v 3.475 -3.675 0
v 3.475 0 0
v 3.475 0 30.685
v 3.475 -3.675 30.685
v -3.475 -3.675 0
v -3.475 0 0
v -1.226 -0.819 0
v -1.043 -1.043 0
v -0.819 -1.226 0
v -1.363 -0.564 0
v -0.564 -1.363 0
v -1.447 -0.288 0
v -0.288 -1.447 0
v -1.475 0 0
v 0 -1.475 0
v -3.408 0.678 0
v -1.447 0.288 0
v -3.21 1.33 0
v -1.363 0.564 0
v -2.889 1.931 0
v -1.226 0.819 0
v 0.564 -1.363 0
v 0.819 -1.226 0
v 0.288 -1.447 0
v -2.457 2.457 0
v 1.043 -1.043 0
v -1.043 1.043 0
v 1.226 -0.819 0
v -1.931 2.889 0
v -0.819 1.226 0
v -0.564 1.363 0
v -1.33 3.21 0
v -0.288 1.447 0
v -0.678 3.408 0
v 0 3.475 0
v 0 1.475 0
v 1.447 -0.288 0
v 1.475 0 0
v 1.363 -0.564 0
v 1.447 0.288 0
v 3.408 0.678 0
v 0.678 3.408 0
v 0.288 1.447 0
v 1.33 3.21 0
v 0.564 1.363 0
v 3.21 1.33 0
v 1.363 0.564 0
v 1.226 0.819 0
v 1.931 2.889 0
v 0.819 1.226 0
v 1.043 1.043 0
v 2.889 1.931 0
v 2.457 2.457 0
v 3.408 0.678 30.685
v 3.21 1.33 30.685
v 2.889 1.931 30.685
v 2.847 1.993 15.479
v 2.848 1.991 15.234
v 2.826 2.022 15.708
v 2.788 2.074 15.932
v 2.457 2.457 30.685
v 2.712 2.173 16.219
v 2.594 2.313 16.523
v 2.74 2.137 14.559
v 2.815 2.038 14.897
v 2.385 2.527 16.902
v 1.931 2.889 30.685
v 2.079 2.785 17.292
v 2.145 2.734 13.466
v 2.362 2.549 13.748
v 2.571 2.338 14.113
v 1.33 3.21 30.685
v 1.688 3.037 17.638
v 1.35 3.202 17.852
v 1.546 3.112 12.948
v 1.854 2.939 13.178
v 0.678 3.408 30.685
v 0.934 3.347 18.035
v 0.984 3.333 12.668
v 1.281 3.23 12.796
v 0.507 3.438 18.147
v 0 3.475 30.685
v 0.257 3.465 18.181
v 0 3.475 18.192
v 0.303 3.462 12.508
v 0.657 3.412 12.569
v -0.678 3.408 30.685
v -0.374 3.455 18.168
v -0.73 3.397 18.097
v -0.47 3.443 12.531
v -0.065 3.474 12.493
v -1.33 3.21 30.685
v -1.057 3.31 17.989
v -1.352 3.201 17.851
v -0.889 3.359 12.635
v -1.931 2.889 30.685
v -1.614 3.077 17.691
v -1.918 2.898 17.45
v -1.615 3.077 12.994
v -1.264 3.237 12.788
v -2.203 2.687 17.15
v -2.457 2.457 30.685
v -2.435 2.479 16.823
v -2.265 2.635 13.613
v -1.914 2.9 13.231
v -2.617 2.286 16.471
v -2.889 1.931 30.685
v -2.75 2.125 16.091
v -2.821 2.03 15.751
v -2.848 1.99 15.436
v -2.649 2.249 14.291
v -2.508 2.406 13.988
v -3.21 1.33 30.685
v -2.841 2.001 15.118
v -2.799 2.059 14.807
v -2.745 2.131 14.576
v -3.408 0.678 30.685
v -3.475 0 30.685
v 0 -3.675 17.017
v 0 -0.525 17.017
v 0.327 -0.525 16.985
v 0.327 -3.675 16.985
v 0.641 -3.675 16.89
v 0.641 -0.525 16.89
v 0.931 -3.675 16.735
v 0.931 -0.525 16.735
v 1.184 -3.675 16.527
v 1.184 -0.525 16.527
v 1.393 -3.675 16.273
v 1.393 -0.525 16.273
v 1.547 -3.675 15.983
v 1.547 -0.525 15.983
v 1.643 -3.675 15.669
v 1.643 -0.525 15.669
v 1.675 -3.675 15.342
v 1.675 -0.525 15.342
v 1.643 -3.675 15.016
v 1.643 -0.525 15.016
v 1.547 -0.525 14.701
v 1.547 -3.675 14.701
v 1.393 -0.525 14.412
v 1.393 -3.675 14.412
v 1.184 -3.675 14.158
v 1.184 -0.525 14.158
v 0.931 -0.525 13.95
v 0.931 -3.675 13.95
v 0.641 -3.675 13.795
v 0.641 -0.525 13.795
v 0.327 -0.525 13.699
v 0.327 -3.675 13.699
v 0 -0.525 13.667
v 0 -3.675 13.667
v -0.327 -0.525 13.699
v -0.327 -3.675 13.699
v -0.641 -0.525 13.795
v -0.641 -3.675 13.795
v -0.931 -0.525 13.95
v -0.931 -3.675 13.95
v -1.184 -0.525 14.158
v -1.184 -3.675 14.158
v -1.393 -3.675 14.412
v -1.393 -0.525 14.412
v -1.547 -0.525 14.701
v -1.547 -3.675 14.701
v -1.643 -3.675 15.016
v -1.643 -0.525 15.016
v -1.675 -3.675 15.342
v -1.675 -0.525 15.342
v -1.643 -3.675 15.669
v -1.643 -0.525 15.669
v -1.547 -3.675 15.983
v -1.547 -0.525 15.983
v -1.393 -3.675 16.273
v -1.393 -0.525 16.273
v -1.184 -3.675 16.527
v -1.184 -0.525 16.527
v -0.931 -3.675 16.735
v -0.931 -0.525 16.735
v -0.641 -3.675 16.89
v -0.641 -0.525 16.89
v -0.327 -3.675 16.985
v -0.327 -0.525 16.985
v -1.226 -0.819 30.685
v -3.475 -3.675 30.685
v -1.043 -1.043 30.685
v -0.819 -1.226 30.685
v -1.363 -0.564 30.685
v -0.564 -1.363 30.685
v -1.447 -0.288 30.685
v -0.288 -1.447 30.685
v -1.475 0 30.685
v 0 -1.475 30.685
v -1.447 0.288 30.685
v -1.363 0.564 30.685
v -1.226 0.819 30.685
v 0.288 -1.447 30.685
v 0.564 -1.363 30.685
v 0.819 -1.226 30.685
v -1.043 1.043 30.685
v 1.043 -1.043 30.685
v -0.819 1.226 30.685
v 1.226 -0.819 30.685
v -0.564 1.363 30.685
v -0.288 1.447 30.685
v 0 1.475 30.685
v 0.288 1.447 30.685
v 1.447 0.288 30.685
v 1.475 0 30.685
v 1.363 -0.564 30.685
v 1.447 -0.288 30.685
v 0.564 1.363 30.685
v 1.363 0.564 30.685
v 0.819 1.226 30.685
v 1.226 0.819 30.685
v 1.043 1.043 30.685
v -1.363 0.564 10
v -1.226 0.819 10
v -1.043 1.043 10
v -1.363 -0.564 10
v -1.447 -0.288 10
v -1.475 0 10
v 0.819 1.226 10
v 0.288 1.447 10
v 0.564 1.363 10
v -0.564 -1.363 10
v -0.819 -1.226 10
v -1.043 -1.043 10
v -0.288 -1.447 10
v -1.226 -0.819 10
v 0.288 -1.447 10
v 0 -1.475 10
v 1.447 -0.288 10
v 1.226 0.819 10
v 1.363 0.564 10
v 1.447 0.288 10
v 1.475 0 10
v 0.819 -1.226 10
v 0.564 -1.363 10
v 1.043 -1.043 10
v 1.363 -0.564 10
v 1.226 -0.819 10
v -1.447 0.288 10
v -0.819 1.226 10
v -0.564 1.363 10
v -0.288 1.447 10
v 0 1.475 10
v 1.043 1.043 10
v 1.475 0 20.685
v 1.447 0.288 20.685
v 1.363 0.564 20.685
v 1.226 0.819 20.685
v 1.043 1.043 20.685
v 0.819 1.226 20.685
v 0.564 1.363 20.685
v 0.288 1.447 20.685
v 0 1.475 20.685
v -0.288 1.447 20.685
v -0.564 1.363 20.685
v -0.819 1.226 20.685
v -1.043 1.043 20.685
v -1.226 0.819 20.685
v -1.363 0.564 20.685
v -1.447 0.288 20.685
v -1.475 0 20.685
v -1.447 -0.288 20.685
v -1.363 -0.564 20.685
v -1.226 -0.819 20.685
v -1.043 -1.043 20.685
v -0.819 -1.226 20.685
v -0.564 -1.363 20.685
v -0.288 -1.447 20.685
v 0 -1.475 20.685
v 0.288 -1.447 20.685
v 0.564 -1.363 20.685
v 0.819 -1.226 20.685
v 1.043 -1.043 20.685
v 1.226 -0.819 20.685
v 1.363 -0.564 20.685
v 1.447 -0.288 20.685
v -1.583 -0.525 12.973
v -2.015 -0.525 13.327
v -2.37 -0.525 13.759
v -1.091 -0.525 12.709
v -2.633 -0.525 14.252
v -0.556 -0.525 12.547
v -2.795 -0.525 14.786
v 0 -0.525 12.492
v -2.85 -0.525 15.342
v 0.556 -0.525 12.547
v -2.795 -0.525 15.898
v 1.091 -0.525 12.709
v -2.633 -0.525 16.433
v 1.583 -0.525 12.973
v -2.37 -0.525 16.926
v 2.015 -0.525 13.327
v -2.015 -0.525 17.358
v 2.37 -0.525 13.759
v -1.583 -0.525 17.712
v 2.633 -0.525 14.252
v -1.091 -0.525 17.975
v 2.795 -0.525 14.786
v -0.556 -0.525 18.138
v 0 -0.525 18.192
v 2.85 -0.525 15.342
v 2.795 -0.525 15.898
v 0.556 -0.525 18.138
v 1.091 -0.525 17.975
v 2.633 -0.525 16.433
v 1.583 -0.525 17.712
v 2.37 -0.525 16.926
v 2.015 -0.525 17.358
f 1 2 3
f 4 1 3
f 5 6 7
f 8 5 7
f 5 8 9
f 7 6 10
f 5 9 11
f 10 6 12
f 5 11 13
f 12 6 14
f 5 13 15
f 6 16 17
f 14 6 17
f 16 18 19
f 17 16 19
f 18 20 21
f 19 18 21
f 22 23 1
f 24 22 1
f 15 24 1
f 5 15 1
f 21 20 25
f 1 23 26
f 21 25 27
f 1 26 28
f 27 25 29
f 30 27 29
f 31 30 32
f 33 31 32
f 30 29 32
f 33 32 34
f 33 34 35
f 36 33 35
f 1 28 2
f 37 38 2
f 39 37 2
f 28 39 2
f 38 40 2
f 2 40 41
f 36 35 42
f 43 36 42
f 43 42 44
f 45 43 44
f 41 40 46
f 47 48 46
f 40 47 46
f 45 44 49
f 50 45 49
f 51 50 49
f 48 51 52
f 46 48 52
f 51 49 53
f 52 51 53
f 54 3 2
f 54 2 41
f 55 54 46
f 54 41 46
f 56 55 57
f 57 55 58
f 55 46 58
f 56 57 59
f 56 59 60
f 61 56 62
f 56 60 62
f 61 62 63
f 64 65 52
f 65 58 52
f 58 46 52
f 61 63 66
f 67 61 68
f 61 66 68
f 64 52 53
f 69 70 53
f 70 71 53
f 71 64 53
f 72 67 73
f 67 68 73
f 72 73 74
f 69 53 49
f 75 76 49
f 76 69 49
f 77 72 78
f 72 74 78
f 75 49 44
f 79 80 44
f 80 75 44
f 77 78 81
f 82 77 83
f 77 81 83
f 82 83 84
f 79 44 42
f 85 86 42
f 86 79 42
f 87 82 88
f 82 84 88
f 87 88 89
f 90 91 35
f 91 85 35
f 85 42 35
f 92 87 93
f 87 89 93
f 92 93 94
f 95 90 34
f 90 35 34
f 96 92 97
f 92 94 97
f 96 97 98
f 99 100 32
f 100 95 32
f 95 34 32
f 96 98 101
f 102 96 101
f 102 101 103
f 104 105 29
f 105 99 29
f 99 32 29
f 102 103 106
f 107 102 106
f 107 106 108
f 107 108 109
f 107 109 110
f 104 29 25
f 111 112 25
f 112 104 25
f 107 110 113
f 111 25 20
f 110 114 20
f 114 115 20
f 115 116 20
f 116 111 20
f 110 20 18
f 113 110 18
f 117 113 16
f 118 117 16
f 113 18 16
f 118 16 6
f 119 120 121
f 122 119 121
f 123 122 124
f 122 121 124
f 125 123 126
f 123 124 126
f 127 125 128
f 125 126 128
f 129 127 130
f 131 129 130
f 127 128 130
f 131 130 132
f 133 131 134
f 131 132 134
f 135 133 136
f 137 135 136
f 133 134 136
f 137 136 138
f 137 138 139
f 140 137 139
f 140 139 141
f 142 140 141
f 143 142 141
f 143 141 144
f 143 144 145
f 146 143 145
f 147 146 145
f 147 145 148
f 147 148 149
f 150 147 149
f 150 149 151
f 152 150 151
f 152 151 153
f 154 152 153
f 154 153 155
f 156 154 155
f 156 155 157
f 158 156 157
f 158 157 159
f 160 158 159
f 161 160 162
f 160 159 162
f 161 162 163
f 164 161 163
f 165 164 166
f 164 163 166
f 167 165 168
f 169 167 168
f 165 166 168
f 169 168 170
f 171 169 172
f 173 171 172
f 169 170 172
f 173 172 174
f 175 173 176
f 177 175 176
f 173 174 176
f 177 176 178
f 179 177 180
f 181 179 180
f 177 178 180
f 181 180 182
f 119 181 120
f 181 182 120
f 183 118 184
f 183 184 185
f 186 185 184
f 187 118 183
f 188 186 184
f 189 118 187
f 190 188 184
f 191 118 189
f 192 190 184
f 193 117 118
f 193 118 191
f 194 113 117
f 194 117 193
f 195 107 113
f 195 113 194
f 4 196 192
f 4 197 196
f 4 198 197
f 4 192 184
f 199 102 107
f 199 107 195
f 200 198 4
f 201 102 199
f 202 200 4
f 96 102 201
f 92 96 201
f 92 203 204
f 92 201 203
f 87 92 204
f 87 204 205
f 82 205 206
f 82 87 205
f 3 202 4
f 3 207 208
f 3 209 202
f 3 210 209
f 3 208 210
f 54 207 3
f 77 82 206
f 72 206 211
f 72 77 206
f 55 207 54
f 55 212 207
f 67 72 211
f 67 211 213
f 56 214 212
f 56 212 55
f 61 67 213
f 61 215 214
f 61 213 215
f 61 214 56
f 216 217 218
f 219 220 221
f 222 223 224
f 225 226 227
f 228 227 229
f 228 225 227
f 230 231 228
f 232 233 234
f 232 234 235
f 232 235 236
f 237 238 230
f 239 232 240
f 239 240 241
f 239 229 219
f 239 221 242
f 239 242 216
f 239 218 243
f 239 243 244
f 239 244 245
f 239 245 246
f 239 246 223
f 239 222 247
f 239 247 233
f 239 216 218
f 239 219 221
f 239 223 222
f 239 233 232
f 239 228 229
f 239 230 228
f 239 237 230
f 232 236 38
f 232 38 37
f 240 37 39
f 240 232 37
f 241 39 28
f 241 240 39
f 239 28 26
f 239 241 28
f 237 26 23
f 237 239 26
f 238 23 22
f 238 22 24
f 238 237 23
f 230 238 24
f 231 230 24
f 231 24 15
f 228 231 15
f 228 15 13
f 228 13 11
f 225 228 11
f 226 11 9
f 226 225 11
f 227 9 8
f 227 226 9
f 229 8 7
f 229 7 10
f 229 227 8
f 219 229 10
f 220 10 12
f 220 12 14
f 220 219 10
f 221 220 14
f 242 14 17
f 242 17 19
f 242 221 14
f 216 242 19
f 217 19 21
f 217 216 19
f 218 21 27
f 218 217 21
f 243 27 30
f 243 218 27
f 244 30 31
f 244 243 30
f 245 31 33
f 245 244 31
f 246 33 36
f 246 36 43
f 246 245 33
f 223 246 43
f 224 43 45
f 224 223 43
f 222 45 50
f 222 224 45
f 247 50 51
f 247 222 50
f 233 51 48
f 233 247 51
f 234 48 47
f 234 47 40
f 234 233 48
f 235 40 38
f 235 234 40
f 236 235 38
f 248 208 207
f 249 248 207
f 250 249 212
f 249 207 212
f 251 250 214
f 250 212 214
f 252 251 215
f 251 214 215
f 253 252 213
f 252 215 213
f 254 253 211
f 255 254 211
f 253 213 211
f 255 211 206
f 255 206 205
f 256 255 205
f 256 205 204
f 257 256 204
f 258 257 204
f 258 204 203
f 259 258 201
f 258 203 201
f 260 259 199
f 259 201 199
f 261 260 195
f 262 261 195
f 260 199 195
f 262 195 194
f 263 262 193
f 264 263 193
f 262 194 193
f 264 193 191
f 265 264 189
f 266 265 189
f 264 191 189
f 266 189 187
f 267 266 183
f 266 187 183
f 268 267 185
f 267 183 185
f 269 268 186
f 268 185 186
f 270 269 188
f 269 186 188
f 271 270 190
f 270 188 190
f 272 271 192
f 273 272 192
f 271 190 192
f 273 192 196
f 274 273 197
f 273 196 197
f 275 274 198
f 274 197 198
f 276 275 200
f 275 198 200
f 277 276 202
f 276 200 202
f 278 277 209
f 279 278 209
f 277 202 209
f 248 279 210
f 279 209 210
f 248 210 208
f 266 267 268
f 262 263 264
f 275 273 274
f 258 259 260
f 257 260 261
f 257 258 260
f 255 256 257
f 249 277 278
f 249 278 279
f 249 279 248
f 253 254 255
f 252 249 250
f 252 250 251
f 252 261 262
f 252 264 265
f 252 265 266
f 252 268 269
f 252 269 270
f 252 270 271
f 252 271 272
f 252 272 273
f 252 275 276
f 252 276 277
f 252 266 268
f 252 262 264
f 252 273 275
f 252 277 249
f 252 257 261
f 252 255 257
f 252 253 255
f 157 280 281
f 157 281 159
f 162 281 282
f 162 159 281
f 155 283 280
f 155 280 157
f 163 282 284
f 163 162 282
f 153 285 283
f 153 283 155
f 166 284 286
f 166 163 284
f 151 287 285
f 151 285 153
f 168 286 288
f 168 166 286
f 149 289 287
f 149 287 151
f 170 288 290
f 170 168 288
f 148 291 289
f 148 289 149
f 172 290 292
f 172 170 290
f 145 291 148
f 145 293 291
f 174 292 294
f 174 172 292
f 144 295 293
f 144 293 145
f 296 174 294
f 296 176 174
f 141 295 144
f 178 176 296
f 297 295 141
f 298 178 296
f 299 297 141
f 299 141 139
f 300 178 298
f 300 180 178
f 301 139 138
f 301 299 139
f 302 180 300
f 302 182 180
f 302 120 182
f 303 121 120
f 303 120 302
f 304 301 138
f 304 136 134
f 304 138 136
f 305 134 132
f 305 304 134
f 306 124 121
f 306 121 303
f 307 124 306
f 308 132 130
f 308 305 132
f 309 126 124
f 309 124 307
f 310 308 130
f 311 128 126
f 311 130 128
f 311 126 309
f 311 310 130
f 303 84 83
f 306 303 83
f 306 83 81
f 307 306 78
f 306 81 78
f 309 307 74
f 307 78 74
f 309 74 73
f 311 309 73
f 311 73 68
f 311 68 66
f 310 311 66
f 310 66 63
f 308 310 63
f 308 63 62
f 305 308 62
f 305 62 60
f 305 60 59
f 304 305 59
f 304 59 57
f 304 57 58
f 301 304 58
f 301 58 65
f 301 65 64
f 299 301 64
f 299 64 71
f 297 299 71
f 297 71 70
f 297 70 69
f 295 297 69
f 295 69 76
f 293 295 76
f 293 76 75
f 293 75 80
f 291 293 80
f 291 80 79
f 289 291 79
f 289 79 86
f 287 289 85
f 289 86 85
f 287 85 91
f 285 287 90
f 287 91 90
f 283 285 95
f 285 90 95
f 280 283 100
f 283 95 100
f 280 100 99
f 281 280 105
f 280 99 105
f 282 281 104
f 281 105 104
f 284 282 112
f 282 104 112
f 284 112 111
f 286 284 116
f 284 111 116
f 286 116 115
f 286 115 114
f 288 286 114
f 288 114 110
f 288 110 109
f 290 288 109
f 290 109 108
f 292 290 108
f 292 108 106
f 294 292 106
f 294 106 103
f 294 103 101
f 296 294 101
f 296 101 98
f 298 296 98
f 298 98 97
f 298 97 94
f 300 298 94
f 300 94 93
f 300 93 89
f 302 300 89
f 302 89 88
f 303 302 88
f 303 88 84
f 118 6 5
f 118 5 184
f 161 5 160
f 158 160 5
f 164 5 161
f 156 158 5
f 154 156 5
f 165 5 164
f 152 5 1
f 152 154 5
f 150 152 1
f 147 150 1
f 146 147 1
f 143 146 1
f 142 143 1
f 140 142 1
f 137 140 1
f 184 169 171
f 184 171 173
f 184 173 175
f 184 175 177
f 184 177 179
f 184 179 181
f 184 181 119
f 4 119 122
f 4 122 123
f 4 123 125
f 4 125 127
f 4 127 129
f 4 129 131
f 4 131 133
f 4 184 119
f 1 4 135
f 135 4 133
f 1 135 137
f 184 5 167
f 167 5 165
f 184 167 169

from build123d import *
from build123d.topology import SkipClean

# Parameters (mm, degrees)
SKETCH2_R           = 3.475
BOSS_EXTRUDE2_DEPTH = 30.6846
SKETCH3_R           = 1.475
CUT_EXTRUDE1_DEPTH  = 10
CUT_EXTRUDE2_START  = -10
SKETCH4_R           = 1.475
CUT_EXTRUDE2_DEPTH  = 10
BOSS_EXTRUDE3_DEPTH = 30.6846
SKETCH6_W           = 6.95
SKETCH6_H           = 30.6846
BOSS_EXTRUDE4_DEPTH = 0.2
SKETCH8_W           = 3
SKETCH8_H           = 2
CUT_EXTRUDE3_DEPTH  = 32.675744698
SKETCH10_R          = 2.85
CUT_EXTRUDE4_DEPTH  = 3
SKETCH11_R          = 1.675
CUT_EXTRUDE5_DEPTH  = 32.138726849
BOSS_EXTRUDE5_REACH = 33.487
SKETCH12_R          = 4.85
SKETCH12_R_2        = 2.85
BOSS_EXTRUDE7_START = 1
SKETCH13_R          = 2.85
BOSS_EXTRUDE7_DEPTH = 1
CUT_EXTRUDE6_DEPTH  = 32.282148424
CUT_EXTRUDE7_DEPTH  = 32.877730235


with BuildPart() as part:
    # Sketch2 → Boss-Extrude2 (new body)
    with BuildSketch(Plane.XY):
        Circle(SKETCH2_R)
    extrude(amount=BOSS_EXTRUDE2_DEPTH)

    # Sketch3 → Cut-Extrude1 (cut)
    with BuildSketch(Plane.XY.offset(30.6846)):
        Circle(SKETCH3_R)
    extrude(amount=-CUT_EXTRUDE1_DEPTH, mode=Mode.SUBTRACT)

    # Sketch4 → Cut-Extrude2 (cut)
    with BuildSketch(Plane(origin=(0, 0, 0), x_dir=(-1, 0, 0), z_dir=(0, 0, -1)).offset(CUT_EXTRUDE2_START)):
        with Locations(Location((0, 0, 0), (0, 0, 180))):
            Circle(SKETCH4_R)
    extrude(amount=CUT_EXTRUDE2_DEPTH, mode=Mode.SUBTRACT)

    # Sketch5 → Boss-Extrude3 (add)
    with BuildSketch(Plane(origin=(0, 0, 0), x_dir=(-1, 0, 0), z_dir=(0, 0, -1))):
        with BuildLine():
            ThreePointArc((0, -3.475), (-2.457196065, -2.457196065), (-3.475, 0))
            Line((-3.475, 0), (-3.475, -3.475))
            Line((-3.475, -3.475), (0, -3.475))
        make_face()
        with BuildLine():
            Line((3.475, -3.475), (3.475, 0))
            ThreePointArc((3.475, 0), (2.457196065, -2.457196065), (0, -3.475))
            Line((0, -3.475), (3.475, -3.475))
        make_face()
    extrude(amount=-BOSS_EXTRUDE3_DEPTH)

    # Sketch6 → Boss-Extrude4 (add)
    with BuildSketch(Plane.XZ.offset(3.475)):
        with Locations((0, 15.3423)):
            Rectangle(SKETCH6_W, SKETCH6_H)
    extrude(amount=BOSS_EXTRUDE4_DEPTH)

    # Sketch8 → Cut-Extrude3 (cut, through all)
    with BuildSketch(Plane.ZY.offset(3.475)):
        with Locations((16.8423, 3.475)):
            Rectangle(SKETCH8_W, SKETCH8_H)
        with Locations((13.8423, 3.475)):
            Rectangle(SKETCH8_W, SKETCH8_H)
    extrude(amount=-CUT_EXTRUDE3_DEPTH, mode=Mode.SUBTRACT)

    # Sketch10 → Cut-Extrude4 (cut)
    with BuildSketch(Plane(origin=(0, 2.475, 0), x_dir=(1, 0, 0), z_dir=(0, 1, 0))):
        with Locations(Location((0, -15.3423, 0), (0, 0, 270))):
            Circle(SKETCH10_R)
    extrude(amount=-CUT_EXTRUDE4_DEPTH, mode=Mode.SUBTRACT)

    # Sketch11 → Cut-Extrude5 (cut, through all)
    with BuildSketch(Plane(origin=(0, -0.525, 0), x_dir=(1, 0, 0), z_dir=(0, 1, 0))):
        with Locations(Location((0, -15.3423, 0), (0, 0, 270))):
            Circle(SKETCH11_R)
    extrude(amount=-CUT_EXTRUDE5_DEPTH, mode=Mode.SUBTRACT)

    # Boss-Extrude5: up to this face of the body (flat: up to its plane)
    boss_extrude5_end = Plane(part.part.faces().sort_by_distance((0, -3.675, 30.369981632))[0])
    # Sketch12 → Boss-Extrude5 (add, up to the picked face)
    with BuildSketch(Plane(origin=(0, 2.475, 0), x_dir=(1, 0, 0), z_dir=(0, 1, 0)), mode=Mode.PRIVATE) as boss_extrude5_sk1:
        with Locations((0, -15.3423)):
            Circle(SKETCH12_R)
        with Locations(Location((0, -15.3423, 0), (0, 0, 270))):
            Circle(SKETCH12_R_2, mode=Mode.SUBTRACT)
    boss_extrude5_tool1 = split(extrude(boss_extrude5_sk1.sketch, amount=-BOSS_EXTRUDE5_REACH, mode=Mode.PRIVATE), bisect_by=boss_extrude5_end, keep=Keep.BOTH, mode=Mode.PRIVATE)
    add(boss_extrude5_tool1.solids().sort_by(Axis((-4.712821, 2.475, 15.3423), (0, -1, 0)))[0])

    # Sketch13 → Boss-Extrude7 (add)
    with BuildSketch(Plane(origin=(0, 2.475, 0), x_dir=(1, 0, 0), z_dir=(0, 1, 0)).offset(BOSS_EXTRUDE7_START)):
        with BuildLine():
            Line((-2.439262184, -19.534256584), (-2.439262184, -18.3423))
            Line((-2.439262184, -18.3423), (2.439262184, -18.3423))
            Line((2.439262184, -18.3423), (2.439262184, -19.534256584))
            ThreePointArc((2.439262184, -19.534256584), (4.85, -15.3423), (2.439262184, -11.150343416))
            Line((2.439262184, -11.150343416), (2.439262184, -12.3423))
            Line((2.439262184, -12.3423), (-2.439262184, -12.3423))
            Line((-2.439262184, -12.3423), (-2.439262184, -11.150343416))
            ThreePointArc((-2.439262184, -11.150343416), (-4.85, -15.3423), (-2.439262184, -19.534256584))
        make_face()
        with Locations(Location((0, -15.3423, 0), (0, 0, 270))):
            Circle(SKETCH13_R, mode=Mode.SUBTRACT)
    extrude(amount=-BOSS_EXTRUDE7_DEPTH)

    # Sketch15 → Cut-Extrude6 (cut, through all)
    with SkipClean():  # the faces are left unmerged after this step: merging them gives an invalid solid
        with BuildSketch(Plane(origin=(0, 0, 0), x_dir=(-1, 0, 0), z_dir=(0, 0, -1))):
            with BuildLine():
                Line((6.975728947, 0), (3.475, 0))
                ThreePointArc((3.475, 0), (0, 3.475), (-3.475, 0))
                Line((-3.475, 0), (-8.171324348, 0))
                Line((-8.171324348, 0), (-8.171324348, 6.073396115))
                Line((-8.171324348, 6.073396115), (6.975728947, 6.073396115))
                Line((6.975728947, 6.073396115), (6.975728947, 0))
            make_face()
        extrude(amount=-CUT_EXTRUDE6_DEPTH, mode=Mode.SUBTRACT)
    add(part.part.scale(1), mode=Mode.REPLACE)  # the faces are merged on a copy

    # Sketch16 → Cut-Extrude7 (cut, through all)
    with BuildSketch(Plane(origin=(0, -3.675, 0), x_dir=(-1, 0, 0), z_dir=(0, -1, 0))):
        Polygon((-3.475, -18.725623071), (-3.475, -11.958976929), (-9.441171238, -13.498522389), (-7.451050634, -19.072360919), align=None)
        Polygon((3.475, -18.725623071), (3.475, -11.958976929), (8.590567713, -11.958976929), (7.591441213, -18.725623071), align=None)
    extrude(amount=-CUT_EXTRUDE7_DEPTH, mode=Mode.SUBTRACT)


solid = part.part
